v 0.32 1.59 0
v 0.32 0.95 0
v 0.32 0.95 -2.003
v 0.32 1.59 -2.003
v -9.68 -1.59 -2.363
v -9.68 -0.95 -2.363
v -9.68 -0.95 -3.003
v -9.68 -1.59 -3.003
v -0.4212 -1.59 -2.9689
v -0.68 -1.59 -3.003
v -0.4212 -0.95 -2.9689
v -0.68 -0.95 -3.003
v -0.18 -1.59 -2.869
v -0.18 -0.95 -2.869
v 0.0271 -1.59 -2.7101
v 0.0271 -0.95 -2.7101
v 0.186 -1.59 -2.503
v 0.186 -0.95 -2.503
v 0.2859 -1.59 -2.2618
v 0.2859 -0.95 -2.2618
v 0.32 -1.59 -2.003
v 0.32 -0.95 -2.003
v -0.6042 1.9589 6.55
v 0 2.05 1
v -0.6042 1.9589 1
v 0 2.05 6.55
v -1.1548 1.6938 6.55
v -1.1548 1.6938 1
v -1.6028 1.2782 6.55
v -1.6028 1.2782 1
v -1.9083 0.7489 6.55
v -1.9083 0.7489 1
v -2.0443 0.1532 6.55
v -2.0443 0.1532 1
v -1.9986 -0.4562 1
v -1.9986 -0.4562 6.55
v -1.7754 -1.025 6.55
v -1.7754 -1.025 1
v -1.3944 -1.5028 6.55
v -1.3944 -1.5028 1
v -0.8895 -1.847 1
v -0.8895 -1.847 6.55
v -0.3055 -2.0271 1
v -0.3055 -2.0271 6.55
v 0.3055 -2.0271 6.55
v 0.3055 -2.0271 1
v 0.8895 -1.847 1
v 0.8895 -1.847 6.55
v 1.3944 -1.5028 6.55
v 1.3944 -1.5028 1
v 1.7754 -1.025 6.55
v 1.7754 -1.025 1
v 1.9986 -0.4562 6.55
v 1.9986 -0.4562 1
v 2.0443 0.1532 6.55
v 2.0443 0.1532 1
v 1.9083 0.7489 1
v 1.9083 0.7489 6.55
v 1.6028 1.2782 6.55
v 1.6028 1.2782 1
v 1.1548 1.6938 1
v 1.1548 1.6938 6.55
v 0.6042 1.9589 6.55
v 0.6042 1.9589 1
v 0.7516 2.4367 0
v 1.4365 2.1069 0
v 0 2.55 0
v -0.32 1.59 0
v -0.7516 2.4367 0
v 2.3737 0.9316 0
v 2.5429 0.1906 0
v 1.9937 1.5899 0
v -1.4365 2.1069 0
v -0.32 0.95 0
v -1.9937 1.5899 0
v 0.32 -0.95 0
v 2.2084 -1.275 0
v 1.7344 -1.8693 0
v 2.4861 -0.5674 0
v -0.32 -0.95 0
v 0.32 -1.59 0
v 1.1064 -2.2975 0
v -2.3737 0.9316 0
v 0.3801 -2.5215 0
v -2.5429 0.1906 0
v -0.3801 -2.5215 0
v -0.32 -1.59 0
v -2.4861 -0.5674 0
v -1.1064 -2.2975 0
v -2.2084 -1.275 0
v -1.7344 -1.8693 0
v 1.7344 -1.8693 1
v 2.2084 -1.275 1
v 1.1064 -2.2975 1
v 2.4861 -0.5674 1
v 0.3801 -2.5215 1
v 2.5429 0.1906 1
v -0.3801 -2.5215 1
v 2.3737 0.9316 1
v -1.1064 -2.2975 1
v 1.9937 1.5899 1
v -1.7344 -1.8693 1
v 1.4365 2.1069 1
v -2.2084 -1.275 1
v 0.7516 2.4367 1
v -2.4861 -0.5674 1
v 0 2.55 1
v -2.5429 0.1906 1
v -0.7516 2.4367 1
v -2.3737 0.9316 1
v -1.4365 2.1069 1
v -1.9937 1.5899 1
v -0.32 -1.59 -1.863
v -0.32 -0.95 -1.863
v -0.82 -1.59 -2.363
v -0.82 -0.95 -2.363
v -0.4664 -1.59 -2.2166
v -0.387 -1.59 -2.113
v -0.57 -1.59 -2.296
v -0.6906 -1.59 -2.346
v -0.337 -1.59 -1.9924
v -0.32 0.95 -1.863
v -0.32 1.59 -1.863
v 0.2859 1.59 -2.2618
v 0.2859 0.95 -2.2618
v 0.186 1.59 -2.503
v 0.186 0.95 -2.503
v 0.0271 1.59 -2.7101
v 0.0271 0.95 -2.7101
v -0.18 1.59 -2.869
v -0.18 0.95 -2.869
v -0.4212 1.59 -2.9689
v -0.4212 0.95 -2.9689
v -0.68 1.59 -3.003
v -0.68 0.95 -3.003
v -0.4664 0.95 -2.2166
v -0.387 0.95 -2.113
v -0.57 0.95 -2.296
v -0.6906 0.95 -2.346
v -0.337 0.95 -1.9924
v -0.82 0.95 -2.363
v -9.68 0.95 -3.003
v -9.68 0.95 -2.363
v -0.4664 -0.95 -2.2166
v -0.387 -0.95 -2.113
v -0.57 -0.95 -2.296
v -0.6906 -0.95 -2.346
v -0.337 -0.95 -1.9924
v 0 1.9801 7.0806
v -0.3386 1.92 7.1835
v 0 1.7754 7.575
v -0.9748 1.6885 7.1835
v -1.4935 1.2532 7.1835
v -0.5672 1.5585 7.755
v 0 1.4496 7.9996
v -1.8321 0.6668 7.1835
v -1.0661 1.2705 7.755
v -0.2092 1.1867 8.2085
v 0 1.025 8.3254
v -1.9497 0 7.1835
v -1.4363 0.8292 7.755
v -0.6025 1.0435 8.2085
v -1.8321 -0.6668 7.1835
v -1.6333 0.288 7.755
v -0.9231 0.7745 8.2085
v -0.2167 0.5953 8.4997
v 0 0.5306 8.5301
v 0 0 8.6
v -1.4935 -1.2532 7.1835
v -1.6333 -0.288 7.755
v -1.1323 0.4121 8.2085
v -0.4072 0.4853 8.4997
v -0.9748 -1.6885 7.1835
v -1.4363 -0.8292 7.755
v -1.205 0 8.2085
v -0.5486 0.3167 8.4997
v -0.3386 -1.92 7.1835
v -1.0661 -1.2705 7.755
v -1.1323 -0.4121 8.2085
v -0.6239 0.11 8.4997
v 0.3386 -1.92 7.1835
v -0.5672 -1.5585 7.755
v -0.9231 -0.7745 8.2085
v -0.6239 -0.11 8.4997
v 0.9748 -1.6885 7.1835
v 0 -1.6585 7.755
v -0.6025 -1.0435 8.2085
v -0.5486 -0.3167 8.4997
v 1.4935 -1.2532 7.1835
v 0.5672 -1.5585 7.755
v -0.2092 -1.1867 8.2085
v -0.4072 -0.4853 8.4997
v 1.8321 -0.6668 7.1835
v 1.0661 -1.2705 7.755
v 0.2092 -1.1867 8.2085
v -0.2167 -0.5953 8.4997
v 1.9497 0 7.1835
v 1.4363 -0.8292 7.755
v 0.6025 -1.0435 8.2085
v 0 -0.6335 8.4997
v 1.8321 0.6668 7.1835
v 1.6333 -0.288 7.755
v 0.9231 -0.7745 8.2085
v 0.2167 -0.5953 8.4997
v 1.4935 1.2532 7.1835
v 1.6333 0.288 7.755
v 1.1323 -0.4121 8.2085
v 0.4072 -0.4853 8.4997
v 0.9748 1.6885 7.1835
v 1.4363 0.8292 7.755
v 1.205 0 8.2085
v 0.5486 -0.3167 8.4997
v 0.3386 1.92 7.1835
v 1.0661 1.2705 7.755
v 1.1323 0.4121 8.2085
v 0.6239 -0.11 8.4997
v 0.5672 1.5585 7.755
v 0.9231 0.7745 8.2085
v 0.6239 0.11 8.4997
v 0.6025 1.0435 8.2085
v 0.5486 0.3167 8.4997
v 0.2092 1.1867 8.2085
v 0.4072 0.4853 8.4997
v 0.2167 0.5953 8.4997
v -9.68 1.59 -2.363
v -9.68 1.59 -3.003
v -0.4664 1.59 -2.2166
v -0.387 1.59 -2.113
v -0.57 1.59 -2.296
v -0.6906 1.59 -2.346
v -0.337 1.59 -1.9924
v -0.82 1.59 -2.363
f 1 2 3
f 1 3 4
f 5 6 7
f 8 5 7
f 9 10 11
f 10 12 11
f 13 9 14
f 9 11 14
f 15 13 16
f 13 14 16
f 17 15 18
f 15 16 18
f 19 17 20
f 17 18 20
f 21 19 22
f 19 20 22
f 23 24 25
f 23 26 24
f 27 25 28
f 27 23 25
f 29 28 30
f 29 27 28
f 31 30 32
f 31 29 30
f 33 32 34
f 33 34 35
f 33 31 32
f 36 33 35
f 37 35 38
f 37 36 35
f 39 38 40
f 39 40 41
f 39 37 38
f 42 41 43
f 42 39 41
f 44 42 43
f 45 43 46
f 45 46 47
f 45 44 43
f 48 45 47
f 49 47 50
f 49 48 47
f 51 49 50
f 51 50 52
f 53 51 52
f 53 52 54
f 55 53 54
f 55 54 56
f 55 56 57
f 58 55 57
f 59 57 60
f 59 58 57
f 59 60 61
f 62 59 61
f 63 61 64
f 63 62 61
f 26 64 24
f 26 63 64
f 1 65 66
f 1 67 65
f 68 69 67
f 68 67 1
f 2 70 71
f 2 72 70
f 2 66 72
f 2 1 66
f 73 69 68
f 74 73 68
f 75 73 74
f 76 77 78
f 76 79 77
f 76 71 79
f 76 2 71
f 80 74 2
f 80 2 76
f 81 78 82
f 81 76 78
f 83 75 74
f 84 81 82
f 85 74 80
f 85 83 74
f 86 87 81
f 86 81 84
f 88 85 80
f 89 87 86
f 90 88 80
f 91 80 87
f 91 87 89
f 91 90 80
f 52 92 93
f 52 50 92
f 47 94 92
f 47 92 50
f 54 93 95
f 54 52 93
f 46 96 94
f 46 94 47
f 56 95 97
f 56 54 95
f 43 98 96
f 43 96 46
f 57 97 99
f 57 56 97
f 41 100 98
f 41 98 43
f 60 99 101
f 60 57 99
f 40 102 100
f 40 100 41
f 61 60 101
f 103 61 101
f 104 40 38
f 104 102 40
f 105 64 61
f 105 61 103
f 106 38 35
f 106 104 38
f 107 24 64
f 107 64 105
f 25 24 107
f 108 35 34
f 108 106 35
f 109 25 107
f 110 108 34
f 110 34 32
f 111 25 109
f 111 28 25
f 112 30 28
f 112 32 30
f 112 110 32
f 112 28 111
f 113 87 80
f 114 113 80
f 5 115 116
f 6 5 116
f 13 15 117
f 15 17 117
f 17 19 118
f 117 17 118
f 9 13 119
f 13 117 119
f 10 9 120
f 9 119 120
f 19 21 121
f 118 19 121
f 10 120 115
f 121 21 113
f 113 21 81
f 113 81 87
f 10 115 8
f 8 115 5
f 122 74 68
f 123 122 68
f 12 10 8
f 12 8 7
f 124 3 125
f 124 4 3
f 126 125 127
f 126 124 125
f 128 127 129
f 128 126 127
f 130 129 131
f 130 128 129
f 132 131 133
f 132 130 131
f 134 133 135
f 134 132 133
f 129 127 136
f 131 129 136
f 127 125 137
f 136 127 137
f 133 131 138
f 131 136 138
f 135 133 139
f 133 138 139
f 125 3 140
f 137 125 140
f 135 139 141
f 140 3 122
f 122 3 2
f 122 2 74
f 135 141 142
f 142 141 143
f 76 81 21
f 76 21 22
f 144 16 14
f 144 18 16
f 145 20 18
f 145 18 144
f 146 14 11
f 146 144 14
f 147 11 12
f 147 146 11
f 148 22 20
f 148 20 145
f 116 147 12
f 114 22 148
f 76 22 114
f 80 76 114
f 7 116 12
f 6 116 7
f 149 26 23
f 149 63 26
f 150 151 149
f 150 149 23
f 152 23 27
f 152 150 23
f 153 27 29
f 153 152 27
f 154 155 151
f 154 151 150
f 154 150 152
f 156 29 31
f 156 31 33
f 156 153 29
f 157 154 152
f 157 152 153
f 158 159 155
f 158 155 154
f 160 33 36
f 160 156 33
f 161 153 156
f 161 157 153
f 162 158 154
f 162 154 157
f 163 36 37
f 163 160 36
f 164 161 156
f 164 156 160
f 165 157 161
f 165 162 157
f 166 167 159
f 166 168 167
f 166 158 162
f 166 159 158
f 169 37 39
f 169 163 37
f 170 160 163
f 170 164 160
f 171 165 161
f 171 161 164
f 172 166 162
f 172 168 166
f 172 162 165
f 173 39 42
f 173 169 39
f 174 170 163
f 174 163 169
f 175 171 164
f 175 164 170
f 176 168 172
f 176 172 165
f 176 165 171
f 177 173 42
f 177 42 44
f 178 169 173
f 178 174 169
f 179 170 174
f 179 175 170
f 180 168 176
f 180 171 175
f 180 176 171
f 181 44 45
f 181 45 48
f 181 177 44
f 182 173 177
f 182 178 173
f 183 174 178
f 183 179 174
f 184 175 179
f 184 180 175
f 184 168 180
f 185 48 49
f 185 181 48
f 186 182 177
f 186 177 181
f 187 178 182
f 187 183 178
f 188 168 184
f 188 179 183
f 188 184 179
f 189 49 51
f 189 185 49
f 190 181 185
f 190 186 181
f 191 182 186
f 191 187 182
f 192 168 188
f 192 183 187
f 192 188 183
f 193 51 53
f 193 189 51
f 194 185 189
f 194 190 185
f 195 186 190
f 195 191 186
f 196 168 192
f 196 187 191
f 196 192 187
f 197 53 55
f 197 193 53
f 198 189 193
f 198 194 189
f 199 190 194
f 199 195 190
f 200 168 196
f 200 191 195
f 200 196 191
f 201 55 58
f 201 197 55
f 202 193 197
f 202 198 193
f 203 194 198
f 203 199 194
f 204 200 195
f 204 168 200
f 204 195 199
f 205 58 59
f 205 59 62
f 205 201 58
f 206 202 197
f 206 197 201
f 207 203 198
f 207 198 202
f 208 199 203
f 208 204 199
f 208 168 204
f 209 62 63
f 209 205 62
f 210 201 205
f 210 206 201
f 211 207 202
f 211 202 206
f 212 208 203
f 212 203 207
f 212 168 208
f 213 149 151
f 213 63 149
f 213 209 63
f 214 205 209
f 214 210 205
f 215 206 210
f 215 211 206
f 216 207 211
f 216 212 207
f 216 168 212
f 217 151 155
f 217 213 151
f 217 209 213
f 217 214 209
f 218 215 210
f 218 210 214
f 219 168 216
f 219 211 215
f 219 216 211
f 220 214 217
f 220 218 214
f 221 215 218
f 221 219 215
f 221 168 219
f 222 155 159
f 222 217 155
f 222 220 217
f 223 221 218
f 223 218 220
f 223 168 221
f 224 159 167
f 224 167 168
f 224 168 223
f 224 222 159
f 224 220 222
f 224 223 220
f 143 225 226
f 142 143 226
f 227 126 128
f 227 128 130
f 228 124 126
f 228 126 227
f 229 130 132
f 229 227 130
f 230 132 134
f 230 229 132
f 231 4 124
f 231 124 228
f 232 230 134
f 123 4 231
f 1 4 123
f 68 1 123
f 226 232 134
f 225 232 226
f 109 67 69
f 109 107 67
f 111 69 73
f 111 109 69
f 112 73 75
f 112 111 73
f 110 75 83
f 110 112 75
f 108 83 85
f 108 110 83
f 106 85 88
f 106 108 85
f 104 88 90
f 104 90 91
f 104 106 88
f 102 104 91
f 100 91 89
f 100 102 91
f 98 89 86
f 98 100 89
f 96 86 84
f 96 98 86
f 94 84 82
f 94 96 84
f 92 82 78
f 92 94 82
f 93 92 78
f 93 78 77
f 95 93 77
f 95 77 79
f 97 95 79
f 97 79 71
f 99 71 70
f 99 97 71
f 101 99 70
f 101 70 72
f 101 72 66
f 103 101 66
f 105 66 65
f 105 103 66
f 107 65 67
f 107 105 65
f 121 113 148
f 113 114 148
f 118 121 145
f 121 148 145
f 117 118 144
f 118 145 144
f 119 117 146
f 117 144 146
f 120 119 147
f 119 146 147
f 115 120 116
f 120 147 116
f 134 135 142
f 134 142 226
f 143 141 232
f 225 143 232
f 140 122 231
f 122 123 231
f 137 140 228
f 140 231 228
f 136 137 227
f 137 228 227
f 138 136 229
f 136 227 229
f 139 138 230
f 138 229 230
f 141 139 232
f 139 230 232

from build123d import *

# Parameters (mm, degrees)
SKETCH3_W           = 0.64
SKETCH3_H           = 0.64
BOSS_EXTRUDE1_DEPTH = 2.683
ESQUISSE1_W         = 0.64
ESQUISSE1_H         = 0.64
BOSS_EXTRU_1_DEPTH  = 10
CONG_1_R            = 1
CONG_1_2_R          = 0.5


with BuildPart() as part:
    # Sketch2 → Base-Revolve (revolve)
    with BuildSketch(Plane(origin=(0, 0, 0), x_dir=(0, 0, -1), z_dir=(1, 0, 0))):
        with BuildLine():
            Line((0, 0), (0, 2.55))
            Line((0, 2.55), (-1, 2.55))
            Line((-1, 2.55), (-1, 2.05))
            Line((-1, 2.05), (-6.55, 2.05))
            ThreePointArc((-6.55, 2.05), (-7.999568901, 1.449568901), (-8.6, 0))
            Line((-8.6, 0), (0, 0))
        make_face()
    revolve(axis=Axis((0, 0, 0), (0, 0, 1)))

    # Sketch3 → Boss-Extrude1 (add)
    with BuildSketch(Plane(origin=(0, 0, 0), x_dir=(-1, 0, 0), z_dir=(0, 0, -1))):
        with Locations((0, 1.27)):
            Rectangle(SKETCH3_W, SKETCH3_H)
        with Locations((0, -1.27)):
            Rectangle(SKETCH3_W, SKETCH3_H)
    extrude(amount=BOSS_EXTRUDE1_DEPTH)

    # Esquisse1 → Boss.-Extru.1 (add)
    with BuildSketch(Plane(origin=(0.32, 0, 0), x_dir=(0, 0, -1), z_dir=(1, 0, 0))):
        with Locations((2.683, -1.27)):
            Rectangle(ESQUISSE1_W, ESQUISSE1_H)
        with Locations((2.683, 1.27)):
            Rectangle(ESQUISSE1_W, ESQUISSE1_H)
    extrude(amount=-BOSS_EXTRU_1_DEPTH)

    # Cong_1
    cong_1_edges = [part.edges().sort_by_distance(p)[0] for p in [
        (0.32, -1.27, -3.003),
        (0.32, 1.27, -3.003),
    ]]
    fillet(cong_1_edges, radius=CONG_1_R)

    # Cong_1 2
    cong_1_2_edges = [part.edges().sort_by_distance(p)[0] for p in [
        (-0.32, 1.27, -2.363),
        (-0.32, -1.27, -2.363),
    ]]
    fillet(cong_1_2_edges, radius=CONG_1_2_R)


solid = part.part
